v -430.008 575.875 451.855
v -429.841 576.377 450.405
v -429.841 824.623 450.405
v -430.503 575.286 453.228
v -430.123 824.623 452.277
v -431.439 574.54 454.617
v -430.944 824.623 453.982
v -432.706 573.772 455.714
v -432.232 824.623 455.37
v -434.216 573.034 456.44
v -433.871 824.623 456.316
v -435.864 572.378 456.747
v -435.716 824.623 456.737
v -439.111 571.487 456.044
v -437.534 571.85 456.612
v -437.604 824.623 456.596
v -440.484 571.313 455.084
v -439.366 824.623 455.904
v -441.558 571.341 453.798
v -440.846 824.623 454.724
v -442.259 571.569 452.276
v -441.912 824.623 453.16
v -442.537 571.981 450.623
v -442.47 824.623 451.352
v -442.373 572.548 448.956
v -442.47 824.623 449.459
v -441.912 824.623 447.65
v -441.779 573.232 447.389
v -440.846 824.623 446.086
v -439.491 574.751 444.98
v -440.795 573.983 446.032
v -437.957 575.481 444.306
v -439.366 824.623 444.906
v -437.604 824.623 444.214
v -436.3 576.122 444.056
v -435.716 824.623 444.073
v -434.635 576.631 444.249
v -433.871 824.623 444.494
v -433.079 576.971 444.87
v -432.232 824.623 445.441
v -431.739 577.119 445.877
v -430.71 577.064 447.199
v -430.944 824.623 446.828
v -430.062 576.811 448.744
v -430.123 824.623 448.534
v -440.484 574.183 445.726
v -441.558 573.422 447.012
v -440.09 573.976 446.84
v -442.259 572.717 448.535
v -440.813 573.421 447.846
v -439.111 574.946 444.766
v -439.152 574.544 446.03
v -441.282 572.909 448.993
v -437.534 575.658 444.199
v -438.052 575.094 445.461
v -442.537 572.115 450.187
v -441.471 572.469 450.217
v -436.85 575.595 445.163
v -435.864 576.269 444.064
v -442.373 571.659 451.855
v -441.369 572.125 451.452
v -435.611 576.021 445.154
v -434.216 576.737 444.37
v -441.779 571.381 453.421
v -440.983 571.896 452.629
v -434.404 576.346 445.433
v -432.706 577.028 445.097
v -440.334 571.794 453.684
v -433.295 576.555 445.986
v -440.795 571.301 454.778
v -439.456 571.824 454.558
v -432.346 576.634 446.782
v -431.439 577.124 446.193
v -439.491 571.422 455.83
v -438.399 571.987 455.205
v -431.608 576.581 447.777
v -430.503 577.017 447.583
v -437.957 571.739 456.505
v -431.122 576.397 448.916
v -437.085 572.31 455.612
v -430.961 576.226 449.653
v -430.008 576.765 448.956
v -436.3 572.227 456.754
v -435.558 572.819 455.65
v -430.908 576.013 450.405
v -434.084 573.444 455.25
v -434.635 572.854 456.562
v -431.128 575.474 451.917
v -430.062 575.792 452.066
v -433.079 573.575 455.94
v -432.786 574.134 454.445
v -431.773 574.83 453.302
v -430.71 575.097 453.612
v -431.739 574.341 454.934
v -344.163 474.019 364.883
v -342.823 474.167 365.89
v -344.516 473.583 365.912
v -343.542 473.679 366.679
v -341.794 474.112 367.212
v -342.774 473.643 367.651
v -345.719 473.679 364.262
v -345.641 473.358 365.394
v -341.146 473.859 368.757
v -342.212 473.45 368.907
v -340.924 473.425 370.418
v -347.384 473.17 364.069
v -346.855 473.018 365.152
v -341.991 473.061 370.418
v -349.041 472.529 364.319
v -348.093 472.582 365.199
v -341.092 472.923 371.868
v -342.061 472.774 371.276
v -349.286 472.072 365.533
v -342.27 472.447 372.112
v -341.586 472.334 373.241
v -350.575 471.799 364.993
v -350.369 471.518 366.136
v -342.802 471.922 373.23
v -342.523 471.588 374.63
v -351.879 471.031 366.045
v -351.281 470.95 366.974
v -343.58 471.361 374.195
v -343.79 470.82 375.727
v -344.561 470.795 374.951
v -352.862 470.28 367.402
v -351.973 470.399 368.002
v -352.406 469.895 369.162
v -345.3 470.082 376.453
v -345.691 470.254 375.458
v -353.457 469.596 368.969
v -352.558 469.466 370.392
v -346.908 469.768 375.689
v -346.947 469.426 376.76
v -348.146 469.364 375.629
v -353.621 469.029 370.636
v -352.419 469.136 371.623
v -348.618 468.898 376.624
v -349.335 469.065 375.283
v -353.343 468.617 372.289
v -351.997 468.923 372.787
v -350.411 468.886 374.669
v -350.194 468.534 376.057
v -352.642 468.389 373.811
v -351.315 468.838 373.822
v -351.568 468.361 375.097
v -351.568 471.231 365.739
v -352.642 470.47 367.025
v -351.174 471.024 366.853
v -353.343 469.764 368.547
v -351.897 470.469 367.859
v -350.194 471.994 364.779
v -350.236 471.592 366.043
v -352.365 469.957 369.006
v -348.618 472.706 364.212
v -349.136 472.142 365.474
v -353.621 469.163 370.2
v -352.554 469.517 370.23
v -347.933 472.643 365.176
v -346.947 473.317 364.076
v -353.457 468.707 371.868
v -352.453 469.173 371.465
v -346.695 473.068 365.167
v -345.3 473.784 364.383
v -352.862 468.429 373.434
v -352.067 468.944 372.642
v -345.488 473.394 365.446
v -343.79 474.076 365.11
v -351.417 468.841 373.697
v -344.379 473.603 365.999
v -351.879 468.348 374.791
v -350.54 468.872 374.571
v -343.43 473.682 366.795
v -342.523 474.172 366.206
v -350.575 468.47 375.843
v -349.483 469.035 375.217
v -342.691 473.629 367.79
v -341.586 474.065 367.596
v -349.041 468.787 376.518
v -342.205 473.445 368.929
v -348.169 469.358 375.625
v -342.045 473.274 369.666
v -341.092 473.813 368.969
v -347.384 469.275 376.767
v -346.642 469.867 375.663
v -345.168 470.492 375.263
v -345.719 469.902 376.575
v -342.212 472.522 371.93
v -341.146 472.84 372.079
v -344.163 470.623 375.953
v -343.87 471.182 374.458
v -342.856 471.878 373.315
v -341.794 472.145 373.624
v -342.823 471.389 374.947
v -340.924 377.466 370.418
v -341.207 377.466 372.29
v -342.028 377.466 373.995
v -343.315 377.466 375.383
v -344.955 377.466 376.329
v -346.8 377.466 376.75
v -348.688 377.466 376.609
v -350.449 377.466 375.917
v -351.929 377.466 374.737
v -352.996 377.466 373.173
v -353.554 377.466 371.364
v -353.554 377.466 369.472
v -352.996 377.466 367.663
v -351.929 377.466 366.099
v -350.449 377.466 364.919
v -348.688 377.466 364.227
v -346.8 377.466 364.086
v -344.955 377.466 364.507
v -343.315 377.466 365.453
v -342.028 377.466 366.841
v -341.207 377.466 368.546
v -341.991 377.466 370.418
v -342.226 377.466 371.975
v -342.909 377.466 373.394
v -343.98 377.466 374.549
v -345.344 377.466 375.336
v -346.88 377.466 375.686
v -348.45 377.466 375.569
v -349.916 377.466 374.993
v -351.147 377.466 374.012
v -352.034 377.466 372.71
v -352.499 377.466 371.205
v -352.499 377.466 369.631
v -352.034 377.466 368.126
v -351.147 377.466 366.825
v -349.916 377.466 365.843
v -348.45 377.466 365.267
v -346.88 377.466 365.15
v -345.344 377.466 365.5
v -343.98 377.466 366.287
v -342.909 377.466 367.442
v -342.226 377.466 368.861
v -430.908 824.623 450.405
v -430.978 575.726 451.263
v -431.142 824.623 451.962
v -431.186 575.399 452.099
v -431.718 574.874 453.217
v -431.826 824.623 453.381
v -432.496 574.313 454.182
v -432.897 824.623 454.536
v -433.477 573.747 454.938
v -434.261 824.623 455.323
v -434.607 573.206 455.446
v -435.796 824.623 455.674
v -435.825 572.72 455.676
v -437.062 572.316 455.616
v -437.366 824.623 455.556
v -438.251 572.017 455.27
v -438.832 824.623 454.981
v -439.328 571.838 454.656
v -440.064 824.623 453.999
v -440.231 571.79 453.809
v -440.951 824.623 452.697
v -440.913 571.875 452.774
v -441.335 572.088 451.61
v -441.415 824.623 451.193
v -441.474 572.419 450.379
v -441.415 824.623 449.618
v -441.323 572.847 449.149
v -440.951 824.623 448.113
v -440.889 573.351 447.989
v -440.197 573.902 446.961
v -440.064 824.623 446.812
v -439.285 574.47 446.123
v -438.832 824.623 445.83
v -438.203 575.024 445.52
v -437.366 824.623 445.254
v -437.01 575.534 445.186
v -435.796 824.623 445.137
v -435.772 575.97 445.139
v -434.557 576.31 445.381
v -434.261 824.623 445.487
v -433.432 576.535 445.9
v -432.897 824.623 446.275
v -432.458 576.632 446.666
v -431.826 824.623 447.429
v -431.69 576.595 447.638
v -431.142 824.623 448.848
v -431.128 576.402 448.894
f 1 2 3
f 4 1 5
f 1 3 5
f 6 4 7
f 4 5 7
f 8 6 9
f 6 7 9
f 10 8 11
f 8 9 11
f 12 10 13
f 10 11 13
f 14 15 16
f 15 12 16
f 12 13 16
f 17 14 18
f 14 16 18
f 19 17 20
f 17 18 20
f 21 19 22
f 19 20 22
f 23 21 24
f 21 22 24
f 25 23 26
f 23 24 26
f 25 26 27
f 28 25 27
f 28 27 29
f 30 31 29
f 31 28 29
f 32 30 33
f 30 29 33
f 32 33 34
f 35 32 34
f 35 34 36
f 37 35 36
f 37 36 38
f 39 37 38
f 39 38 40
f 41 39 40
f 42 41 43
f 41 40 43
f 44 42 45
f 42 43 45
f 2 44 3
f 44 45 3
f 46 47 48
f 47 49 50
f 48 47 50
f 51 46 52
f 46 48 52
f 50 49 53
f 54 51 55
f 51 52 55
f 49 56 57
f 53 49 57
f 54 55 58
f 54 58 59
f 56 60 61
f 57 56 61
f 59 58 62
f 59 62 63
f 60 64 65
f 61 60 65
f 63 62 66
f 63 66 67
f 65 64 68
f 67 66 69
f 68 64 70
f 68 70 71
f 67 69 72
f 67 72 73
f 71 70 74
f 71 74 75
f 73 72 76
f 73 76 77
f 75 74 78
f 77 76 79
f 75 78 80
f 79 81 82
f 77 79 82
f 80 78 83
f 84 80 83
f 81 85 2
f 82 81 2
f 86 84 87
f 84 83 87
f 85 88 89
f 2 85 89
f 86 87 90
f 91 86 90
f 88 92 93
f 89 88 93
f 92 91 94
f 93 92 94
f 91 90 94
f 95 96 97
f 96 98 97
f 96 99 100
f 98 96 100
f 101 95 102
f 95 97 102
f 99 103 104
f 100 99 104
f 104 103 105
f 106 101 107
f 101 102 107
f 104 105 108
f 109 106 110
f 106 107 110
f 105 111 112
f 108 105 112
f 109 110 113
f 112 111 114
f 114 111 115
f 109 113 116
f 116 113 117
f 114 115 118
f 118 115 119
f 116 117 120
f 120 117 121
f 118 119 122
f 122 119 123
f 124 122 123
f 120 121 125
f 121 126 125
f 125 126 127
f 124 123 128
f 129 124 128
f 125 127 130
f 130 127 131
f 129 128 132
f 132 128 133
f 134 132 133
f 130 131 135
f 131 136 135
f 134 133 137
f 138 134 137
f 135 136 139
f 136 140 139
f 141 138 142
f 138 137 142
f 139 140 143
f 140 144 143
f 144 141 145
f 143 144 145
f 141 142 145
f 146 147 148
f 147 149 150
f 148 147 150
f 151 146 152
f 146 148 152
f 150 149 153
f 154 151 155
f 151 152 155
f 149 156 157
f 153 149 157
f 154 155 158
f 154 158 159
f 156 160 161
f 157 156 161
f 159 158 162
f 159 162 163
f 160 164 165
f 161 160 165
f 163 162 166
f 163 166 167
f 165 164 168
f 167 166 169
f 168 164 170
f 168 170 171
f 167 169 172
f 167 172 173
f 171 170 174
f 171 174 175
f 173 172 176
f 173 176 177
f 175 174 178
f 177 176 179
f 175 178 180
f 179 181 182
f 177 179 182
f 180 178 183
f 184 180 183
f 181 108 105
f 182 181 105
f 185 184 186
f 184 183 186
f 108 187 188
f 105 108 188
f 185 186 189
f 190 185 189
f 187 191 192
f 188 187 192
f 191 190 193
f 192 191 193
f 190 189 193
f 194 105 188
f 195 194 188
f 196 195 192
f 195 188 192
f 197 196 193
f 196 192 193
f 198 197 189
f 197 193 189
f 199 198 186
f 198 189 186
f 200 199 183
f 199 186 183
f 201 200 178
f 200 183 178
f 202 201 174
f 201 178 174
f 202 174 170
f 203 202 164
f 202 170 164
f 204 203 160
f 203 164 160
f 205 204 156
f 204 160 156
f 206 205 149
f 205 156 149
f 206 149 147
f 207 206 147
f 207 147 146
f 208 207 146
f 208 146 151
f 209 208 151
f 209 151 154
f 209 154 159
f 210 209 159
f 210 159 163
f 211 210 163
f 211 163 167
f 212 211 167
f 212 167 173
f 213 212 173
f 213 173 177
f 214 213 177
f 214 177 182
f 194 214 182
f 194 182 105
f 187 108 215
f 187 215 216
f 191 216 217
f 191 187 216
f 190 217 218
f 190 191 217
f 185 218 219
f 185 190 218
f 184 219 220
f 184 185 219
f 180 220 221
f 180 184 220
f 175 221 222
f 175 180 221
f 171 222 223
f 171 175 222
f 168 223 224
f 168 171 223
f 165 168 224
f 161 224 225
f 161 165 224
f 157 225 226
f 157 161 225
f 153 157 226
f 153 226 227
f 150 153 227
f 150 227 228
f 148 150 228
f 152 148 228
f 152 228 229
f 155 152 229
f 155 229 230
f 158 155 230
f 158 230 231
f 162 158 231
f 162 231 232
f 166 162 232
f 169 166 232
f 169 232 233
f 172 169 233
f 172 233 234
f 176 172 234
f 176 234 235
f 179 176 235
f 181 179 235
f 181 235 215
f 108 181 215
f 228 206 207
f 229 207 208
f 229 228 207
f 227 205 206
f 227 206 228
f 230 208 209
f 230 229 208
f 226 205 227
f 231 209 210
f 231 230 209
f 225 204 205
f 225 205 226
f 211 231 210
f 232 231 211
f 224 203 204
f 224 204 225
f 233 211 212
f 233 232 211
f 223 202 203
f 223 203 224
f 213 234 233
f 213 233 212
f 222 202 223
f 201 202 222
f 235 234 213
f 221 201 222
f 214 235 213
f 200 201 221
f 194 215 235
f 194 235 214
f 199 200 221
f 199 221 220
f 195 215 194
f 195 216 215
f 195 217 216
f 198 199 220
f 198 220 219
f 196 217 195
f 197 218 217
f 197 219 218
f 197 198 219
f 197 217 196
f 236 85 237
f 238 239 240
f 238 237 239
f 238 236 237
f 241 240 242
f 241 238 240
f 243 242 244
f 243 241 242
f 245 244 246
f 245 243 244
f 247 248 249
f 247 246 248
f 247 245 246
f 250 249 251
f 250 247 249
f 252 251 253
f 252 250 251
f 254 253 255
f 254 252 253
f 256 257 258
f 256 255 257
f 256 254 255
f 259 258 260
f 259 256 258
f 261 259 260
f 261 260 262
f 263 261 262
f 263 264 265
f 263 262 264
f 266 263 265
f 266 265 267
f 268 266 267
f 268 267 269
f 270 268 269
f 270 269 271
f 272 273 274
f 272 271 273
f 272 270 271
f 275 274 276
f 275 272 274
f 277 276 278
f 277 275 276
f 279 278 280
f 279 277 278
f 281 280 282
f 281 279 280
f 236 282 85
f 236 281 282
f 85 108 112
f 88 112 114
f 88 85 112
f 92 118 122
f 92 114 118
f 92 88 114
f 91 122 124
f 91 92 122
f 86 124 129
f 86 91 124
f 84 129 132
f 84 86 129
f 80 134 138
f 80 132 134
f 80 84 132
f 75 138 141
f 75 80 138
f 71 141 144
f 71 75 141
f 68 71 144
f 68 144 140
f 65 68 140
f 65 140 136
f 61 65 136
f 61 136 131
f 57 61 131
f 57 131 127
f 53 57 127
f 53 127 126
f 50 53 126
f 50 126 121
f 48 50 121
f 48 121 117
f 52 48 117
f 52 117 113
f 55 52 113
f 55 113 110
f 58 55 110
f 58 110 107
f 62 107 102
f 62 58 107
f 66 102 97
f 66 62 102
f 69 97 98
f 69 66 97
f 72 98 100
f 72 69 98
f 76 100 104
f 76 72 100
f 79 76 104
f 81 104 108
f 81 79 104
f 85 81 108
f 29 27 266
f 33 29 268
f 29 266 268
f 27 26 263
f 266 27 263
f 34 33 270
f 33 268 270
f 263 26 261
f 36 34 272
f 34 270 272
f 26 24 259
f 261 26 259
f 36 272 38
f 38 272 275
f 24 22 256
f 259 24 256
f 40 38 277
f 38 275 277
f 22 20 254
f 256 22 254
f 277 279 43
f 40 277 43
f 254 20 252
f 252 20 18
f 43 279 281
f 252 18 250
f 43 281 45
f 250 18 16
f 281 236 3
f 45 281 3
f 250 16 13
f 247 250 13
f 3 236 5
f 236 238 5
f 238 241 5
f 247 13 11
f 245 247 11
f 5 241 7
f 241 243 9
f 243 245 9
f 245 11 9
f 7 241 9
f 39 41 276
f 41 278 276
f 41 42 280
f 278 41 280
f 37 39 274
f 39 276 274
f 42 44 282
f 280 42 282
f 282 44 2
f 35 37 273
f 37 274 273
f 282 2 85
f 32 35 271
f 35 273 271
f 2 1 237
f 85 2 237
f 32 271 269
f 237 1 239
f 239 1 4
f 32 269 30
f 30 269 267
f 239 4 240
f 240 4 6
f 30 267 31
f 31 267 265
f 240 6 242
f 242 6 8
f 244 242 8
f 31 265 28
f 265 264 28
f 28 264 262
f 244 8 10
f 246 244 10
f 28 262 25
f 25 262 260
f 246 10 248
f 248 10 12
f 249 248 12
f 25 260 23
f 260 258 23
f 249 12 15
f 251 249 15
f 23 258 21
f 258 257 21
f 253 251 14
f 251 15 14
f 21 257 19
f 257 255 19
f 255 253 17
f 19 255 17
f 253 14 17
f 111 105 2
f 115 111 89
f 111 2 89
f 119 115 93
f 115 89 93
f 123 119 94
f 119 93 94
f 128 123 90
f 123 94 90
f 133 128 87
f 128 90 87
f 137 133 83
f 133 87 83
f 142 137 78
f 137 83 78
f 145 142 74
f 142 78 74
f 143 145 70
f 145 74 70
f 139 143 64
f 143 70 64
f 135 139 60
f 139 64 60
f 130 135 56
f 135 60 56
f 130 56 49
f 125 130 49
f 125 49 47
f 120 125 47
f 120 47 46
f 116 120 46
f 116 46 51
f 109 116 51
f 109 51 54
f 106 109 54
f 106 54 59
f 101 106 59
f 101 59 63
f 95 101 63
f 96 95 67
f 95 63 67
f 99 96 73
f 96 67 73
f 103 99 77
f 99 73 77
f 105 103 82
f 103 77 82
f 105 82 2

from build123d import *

# Parameters (mm, degrees)
SKETCH1_R                 = 6.35
SKETCH1_R_2               = 5.2832
PIPE_0_5_SCH_40_1_DEPTH   = 255.530329215
SKETCH1_ON_SEGMENT_2_R    = 6.35
SKETCH1_ON_SEGMENT_2_R_2  = 5.2832
PIPE_0_5_SCH_40_1_2_DEPTH = 168.045193957
SKETCH1_ON_SEGMENT_3_R    = 6.35
SKETCH1_ON_SEGMENT_3_R_2  = 5.2832
PIPE_0_5_SCH_40_1_3_DEPTH = 98.912631109


with BuildPart() as part:
    # Sketch1 → Pipe 0.5 SCH 40(1) (new body)
    with BuildSketch(Plane(origin=(-436.190807933, 824.623396558, 450.405195918), x_dir=(1, 0, 0), z_dir=(0, -1, 0))):
        Circle(SKETCH1_R)
        Circle(SKETCH1_R_2, mode=Mode.SUBTRACT)
    extrude(amount=PIPE_0_5_SCH_40_1_DEPTH)

    # Pipe 0.5 SCH 40(1) mitre 1
    split(bisect_by=Plane(origin=(-436.190807933, 574.211936593, 450.405195918), x_dir=(-0.946486903, -0.322742224, 0), z_dir=(-0.309943518, 0.908952901, 0.278818291)), keep=Keep.TOP)


with BuildPart() as body_2:
    # Sketch1 on segment 2 (carried to segment 2) → Pipe 0.5 SCH 40_1 2 (new body)
    with BuildSketch(Plane(origin=(-439.075025188, 577.551439556, 452.999773567), x_dir=(0.807870031, 0.56344812, 0.172835844), z_dir=(0.56344812, -0.652390753, -0.506865388))):
        Circle(SKETCH1_ON_SEGMENT_2_R)
        Circle(SKETCH1_ON_SEGMENT_2_R_2, mode=Mode.SUBTRACT)
    extrude(amount=PIPE_0_5_SCH_40_1_2_DEPTH)

    # Pipe 0.5 SCH 40_1 2 mitre 1
    split(bisect_by=Plane(origin=(-436.190807933, 574.211936593, 450.405195918), x_dir=(0.946486903, 0.322742224, 0), z_dir=(0.309943518, -0.908952901, -0.278818291)), keep=Keep.TOP)

    # Pipe 0.5 SCH 40_1 2 mitre 2
    split(bisect_by=Plane(origin=(-347.274493823, 471.259811951, 370.418058734), x_dir=(-0.946486903, -0.322742224, 0), z_dir=(-0.309943518, 0.908952901, 0.278818291)), keep=Keep.TOP)


with BuildPart() as body_3:
    # Sketch1 on segment 3 (carried to segment 3) → Pipe 0.5 SCH 40_1 3 (new body)
    with BuildSketch(Plane(origin=(-347.274493823, 476.378681201, 370.418058734), x_dir=(1, 0, 0), z_dir=(0, -1, 0))):
        Circle(SKETCH1_ON_SEGMENT_3_R)
        Circle(SKETCH1_ON_SEGMENT_3_R_2, mode=Mode.SUBTRACT)
    extrude(amount=PIPE_0_5_SCH_40_1_3_DEPTH)

    # Pipe 0.5 SCH 40_1 3 mitre 1
    split(bisect_by=Plane(origin=(-347.274493823, 471.259811951, 370.418058734), x_dir=(0.946486903, 0.322742224, 0), z_dir=(0.309943518, -0.908952901, -0.278818291)), keep=Keep.TOP)


solid = Compound([part.part, body_2.part, body_3.part])
